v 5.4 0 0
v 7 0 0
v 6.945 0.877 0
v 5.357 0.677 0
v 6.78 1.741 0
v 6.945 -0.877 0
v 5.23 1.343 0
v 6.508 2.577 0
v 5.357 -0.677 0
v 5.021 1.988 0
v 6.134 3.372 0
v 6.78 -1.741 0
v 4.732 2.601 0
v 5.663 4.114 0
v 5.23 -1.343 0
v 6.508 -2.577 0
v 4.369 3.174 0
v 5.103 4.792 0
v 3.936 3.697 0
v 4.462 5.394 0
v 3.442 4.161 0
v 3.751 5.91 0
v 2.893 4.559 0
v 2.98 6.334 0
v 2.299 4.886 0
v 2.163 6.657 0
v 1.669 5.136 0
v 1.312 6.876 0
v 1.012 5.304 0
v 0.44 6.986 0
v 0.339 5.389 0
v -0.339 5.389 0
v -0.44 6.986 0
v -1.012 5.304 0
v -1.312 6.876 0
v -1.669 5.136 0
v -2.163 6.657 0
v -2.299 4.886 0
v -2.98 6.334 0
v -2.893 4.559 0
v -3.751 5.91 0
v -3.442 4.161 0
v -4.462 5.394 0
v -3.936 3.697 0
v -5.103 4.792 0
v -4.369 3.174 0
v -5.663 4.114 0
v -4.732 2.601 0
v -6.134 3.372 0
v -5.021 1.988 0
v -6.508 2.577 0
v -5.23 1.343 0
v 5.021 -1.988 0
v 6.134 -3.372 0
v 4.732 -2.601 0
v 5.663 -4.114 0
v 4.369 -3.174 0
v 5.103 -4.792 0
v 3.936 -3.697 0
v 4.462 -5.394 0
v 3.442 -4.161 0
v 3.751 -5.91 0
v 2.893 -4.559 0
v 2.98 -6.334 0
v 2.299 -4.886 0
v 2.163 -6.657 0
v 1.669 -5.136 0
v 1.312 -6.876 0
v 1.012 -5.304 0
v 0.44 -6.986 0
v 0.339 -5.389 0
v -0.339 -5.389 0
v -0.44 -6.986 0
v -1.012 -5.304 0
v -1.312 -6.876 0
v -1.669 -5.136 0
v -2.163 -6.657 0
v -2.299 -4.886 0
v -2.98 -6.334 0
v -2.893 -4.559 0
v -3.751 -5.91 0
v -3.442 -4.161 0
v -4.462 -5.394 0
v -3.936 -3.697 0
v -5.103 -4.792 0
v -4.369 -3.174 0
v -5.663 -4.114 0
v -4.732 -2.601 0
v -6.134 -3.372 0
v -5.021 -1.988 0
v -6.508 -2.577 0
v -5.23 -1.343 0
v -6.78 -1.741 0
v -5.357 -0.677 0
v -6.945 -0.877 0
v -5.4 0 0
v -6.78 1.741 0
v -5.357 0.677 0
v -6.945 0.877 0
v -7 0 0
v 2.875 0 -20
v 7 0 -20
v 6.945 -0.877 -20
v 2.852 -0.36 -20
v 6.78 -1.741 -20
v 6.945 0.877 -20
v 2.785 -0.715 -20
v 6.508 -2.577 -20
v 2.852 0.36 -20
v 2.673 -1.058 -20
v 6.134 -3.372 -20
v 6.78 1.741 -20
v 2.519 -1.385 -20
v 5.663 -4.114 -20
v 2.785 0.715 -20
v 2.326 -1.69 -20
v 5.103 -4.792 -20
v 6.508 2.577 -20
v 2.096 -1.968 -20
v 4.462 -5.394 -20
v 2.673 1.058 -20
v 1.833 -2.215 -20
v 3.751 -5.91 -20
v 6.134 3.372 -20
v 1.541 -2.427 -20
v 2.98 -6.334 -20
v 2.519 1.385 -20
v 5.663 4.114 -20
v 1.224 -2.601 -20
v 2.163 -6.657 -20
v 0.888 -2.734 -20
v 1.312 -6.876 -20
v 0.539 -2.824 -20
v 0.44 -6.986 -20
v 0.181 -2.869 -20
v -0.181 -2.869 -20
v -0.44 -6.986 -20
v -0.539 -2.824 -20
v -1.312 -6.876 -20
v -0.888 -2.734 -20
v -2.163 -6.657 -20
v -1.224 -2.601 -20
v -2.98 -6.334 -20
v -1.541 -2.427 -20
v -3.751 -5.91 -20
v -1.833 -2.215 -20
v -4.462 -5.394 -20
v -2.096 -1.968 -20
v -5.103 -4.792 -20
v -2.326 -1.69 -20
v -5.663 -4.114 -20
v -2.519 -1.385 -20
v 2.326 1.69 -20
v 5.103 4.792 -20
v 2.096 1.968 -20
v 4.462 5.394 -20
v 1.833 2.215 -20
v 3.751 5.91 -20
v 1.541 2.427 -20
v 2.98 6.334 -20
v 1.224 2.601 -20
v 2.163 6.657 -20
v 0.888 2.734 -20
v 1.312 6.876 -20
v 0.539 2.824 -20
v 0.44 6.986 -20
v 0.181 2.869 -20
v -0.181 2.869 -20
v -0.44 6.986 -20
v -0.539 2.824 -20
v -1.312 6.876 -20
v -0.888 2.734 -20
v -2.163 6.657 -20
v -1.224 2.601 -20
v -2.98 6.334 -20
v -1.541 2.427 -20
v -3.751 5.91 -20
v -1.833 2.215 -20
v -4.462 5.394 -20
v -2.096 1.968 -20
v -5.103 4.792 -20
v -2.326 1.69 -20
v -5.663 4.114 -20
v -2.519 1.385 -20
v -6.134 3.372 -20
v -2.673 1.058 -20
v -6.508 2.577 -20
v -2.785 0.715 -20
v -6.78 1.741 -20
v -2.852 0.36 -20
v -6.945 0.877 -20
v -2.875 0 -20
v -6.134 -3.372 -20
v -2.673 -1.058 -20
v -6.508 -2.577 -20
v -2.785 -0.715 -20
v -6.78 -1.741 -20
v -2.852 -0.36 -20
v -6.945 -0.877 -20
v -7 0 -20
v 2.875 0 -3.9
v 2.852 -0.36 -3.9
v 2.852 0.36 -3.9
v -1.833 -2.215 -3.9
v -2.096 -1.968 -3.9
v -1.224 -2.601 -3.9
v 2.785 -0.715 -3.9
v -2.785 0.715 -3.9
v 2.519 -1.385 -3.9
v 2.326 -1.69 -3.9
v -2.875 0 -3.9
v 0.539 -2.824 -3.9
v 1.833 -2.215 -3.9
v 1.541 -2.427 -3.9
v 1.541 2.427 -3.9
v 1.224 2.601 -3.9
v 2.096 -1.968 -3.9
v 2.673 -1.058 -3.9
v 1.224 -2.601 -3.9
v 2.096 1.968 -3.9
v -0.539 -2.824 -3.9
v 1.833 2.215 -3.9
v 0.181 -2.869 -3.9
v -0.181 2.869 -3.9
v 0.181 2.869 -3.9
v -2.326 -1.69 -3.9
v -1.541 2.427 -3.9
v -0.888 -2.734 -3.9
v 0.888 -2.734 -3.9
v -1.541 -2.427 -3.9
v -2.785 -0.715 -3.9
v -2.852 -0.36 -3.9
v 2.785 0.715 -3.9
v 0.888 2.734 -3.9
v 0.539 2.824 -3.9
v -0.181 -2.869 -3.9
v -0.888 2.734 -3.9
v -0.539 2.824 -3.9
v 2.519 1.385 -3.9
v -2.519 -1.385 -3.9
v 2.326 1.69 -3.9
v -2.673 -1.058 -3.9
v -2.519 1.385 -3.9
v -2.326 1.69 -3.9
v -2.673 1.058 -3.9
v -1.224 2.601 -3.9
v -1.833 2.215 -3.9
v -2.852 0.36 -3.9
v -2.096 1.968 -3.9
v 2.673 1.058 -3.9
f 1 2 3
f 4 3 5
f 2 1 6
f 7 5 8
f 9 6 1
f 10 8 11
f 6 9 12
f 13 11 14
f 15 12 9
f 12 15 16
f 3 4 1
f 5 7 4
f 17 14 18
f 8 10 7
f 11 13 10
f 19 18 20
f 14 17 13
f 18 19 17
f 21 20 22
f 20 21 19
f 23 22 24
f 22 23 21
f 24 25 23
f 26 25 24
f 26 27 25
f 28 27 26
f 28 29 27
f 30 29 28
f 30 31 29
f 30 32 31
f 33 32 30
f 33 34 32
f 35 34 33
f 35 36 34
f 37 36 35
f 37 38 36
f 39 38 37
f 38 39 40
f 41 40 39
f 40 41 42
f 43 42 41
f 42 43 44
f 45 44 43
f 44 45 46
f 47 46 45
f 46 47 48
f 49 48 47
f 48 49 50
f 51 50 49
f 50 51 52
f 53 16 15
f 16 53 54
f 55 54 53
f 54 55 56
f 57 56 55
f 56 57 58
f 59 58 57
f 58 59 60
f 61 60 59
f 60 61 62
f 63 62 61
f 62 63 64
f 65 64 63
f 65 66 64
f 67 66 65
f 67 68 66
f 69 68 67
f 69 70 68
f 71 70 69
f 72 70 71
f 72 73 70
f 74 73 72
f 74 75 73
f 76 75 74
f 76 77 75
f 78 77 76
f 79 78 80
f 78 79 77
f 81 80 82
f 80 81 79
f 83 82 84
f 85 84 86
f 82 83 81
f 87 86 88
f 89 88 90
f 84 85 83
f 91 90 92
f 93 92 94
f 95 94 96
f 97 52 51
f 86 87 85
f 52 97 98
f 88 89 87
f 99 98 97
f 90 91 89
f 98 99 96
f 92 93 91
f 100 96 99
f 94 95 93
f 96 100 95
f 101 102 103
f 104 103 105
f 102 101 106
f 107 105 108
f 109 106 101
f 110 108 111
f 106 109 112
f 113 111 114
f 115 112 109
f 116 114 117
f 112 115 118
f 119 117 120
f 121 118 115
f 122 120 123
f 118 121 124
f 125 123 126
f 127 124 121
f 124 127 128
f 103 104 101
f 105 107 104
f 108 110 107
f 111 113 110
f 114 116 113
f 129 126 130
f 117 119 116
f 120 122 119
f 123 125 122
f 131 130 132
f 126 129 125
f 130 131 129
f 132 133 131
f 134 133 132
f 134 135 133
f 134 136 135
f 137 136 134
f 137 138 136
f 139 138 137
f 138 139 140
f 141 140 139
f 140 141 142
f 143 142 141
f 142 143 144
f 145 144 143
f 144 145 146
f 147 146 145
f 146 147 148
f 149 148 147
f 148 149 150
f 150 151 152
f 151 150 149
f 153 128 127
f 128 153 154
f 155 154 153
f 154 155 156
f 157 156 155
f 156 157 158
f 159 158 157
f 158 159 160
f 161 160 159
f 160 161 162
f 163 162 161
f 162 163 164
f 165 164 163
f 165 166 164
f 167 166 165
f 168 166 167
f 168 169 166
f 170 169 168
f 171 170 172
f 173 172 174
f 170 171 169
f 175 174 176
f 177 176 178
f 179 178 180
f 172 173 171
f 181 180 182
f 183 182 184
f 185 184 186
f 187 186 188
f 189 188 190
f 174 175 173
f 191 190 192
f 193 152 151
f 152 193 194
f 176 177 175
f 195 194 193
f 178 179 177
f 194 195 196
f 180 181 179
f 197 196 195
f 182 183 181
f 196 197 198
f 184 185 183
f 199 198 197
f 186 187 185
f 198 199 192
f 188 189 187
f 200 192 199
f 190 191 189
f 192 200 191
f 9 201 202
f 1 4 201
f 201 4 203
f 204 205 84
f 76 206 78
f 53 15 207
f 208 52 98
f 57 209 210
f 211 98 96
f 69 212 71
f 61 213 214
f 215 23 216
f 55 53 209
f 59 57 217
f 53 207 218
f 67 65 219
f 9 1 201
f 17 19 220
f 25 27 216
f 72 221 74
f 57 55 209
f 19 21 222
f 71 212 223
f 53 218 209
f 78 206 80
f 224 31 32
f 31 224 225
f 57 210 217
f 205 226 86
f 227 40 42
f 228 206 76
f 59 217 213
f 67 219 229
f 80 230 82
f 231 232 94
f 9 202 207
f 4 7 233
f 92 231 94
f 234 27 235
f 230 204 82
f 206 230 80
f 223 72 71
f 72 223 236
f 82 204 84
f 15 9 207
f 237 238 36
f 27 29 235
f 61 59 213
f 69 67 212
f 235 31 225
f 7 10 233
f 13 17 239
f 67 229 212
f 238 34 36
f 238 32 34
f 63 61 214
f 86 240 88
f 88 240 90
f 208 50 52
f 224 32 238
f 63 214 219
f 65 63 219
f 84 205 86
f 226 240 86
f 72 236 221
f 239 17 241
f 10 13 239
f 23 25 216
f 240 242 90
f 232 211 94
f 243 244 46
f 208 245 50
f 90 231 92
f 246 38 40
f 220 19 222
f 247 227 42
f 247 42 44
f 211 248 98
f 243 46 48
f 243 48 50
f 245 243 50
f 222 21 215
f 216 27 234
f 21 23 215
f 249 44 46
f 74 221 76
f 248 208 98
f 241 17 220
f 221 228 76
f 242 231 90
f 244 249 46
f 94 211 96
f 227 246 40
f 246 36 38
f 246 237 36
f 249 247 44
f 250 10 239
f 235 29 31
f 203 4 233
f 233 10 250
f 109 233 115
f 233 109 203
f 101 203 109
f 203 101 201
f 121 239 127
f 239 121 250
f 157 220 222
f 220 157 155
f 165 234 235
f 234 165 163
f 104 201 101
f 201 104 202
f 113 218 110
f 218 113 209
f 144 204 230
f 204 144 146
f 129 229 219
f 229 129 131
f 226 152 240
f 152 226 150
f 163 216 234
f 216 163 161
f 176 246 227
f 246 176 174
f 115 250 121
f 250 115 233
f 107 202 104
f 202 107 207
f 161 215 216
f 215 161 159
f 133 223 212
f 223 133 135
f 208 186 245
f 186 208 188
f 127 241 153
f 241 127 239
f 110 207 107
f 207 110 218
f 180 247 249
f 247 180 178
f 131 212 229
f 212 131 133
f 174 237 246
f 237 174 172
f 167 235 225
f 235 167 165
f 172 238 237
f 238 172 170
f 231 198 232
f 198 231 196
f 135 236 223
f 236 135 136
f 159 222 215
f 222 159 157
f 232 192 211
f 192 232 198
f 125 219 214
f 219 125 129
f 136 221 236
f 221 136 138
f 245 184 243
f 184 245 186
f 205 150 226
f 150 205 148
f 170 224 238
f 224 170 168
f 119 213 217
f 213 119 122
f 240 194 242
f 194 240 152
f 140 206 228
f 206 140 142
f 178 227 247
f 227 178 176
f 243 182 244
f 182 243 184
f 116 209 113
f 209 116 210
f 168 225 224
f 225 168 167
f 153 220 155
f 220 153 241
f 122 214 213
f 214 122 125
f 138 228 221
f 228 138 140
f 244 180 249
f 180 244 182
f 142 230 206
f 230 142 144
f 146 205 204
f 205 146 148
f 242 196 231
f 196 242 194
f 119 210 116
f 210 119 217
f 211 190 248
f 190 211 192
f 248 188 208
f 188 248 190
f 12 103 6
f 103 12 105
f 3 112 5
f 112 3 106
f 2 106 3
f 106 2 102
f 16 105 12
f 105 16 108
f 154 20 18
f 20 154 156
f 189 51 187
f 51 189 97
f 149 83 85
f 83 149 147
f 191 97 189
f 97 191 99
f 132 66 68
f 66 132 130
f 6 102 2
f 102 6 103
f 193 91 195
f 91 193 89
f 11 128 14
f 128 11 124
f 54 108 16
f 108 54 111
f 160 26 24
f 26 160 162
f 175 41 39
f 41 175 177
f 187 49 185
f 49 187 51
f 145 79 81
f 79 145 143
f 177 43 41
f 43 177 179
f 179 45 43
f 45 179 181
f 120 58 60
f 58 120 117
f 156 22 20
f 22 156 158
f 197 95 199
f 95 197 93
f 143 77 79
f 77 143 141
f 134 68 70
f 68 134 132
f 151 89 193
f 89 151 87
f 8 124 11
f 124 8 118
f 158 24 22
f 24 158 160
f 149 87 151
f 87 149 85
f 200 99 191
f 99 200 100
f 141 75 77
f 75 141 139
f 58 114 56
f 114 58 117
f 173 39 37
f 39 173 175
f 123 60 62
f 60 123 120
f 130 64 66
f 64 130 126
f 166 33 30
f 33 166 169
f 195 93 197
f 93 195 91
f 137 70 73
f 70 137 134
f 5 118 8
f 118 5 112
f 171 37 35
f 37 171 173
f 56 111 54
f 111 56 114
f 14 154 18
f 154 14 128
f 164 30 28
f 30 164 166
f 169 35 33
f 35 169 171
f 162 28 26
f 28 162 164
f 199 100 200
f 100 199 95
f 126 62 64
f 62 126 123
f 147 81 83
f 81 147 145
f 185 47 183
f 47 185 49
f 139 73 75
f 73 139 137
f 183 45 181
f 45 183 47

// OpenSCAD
$fn = 50;


difference() {
	union() {
		translate(v = [0, 0, -20.0000000000]) {
			cylinder(h = 20, r = 7.0000000000);
		}
		cylinder(h = 0, r = 10.0000000000);
	}
	union() {
		translate(v = [0, 0, 0]) {
			rotate(a = [0, 0, 0]) {
				difference() {
					union() {
						#translate(v = [0, 0, -20.0000000000]) {
							cylinder(h = 20, r = 2.6000000000);
						}
						#translate(v = [0, 0, -3.9000000000]) {
							cylinder(h = 3.9000000000, r = 7.0000000000, r1 = 2.8750000000, r2 = 5.4000000000);
						}
						#translate(v = [0, 0, -20.0000000000]) {
							cylinder(h = 20, r = 2.8750000000);
						}
						#translate(v = [0, 0, -20.0000000000]) {
							cylinder(h = 20, r = 2.6000000000);
						}
					}
					union();
				}
			}
		}
	}
}
